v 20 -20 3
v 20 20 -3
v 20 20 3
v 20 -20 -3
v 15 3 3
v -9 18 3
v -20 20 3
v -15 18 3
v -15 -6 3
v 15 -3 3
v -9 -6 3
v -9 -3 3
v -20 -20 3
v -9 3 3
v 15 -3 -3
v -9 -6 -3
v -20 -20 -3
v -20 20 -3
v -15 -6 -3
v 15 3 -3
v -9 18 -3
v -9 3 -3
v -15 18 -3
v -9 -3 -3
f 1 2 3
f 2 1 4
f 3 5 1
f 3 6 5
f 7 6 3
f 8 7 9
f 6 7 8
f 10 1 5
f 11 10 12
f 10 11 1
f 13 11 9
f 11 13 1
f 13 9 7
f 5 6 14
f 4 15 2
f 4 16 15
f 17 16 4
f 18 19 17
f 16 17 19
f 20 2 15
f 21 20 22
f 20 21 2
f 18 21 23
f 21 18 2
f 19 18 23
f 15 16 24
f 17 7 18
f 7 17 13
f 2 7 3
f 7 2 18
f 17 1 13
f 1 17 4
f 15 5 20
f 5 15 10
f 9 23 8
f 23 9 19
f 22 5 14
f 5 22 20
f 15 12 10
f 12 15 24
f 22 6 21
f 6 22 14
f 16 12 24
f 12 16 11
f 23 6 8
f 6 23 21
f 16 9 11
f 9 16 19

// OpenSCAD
// 09 L 形贯通槽 —— 开口环**非凸**的贯通通道
//
// 真值：瓶颈半径 = 3.750（板 6 厚，L 的**截面**最大内切圆解析值 = 3.750，圆心在 (-11.25, 0)；
//       注意：3.750 > 臂宽的一半 3.0 —— 拐弯处的"肘部"是个更宽的口袋，能塞下更大的球）
//
// 这一件是**两个不同问题的对照件**：
//
// (1) `list_features` 判"贯通"的办法是**从孔的拟合圆心沿面法向投一条射线**。
//     L 形的拟合圆心落在**缺角处的材料里**（不在开口内），射线一进去就撞到材料，
//     于是它把这个**真贯通**的槽报成 through=false、depthMm≈0.001 —— **假"盲"**。
//     ⇒ "能不能判是不是贯通"的分界**不是圆与不圆**，而是**开口环是否简单/凸**
//       （圆孔 ✓、椭圆颈 ✓、矩形直槽 ✓、L 形 ✗）。
//
// (2) 用哪个轴切也必须是"横切": 这件真正的通路是**穿过板厚**（z 向），
//     L 只是开口的形状。若拿 x 或 y 当轴去切，平面会顺着通路走 ——
//     台架的"必须是内孔"过滤会把那些刀**全部拒掉**（实测 100/100 拒绝），
//     这是对的：横切的判据本来就要求"这张平面把通路两端分开"。
difference() {
  cube([40, 40, 6], center = true);
  cube([30, 6, 20], center = true);                              // x∈[-15,15], y∈[-3,3]
  translate([-12, 6, 0]) cube([6, 24, 20], center = true);       // x∈[-15,-9], y∈[-6,18]
}
